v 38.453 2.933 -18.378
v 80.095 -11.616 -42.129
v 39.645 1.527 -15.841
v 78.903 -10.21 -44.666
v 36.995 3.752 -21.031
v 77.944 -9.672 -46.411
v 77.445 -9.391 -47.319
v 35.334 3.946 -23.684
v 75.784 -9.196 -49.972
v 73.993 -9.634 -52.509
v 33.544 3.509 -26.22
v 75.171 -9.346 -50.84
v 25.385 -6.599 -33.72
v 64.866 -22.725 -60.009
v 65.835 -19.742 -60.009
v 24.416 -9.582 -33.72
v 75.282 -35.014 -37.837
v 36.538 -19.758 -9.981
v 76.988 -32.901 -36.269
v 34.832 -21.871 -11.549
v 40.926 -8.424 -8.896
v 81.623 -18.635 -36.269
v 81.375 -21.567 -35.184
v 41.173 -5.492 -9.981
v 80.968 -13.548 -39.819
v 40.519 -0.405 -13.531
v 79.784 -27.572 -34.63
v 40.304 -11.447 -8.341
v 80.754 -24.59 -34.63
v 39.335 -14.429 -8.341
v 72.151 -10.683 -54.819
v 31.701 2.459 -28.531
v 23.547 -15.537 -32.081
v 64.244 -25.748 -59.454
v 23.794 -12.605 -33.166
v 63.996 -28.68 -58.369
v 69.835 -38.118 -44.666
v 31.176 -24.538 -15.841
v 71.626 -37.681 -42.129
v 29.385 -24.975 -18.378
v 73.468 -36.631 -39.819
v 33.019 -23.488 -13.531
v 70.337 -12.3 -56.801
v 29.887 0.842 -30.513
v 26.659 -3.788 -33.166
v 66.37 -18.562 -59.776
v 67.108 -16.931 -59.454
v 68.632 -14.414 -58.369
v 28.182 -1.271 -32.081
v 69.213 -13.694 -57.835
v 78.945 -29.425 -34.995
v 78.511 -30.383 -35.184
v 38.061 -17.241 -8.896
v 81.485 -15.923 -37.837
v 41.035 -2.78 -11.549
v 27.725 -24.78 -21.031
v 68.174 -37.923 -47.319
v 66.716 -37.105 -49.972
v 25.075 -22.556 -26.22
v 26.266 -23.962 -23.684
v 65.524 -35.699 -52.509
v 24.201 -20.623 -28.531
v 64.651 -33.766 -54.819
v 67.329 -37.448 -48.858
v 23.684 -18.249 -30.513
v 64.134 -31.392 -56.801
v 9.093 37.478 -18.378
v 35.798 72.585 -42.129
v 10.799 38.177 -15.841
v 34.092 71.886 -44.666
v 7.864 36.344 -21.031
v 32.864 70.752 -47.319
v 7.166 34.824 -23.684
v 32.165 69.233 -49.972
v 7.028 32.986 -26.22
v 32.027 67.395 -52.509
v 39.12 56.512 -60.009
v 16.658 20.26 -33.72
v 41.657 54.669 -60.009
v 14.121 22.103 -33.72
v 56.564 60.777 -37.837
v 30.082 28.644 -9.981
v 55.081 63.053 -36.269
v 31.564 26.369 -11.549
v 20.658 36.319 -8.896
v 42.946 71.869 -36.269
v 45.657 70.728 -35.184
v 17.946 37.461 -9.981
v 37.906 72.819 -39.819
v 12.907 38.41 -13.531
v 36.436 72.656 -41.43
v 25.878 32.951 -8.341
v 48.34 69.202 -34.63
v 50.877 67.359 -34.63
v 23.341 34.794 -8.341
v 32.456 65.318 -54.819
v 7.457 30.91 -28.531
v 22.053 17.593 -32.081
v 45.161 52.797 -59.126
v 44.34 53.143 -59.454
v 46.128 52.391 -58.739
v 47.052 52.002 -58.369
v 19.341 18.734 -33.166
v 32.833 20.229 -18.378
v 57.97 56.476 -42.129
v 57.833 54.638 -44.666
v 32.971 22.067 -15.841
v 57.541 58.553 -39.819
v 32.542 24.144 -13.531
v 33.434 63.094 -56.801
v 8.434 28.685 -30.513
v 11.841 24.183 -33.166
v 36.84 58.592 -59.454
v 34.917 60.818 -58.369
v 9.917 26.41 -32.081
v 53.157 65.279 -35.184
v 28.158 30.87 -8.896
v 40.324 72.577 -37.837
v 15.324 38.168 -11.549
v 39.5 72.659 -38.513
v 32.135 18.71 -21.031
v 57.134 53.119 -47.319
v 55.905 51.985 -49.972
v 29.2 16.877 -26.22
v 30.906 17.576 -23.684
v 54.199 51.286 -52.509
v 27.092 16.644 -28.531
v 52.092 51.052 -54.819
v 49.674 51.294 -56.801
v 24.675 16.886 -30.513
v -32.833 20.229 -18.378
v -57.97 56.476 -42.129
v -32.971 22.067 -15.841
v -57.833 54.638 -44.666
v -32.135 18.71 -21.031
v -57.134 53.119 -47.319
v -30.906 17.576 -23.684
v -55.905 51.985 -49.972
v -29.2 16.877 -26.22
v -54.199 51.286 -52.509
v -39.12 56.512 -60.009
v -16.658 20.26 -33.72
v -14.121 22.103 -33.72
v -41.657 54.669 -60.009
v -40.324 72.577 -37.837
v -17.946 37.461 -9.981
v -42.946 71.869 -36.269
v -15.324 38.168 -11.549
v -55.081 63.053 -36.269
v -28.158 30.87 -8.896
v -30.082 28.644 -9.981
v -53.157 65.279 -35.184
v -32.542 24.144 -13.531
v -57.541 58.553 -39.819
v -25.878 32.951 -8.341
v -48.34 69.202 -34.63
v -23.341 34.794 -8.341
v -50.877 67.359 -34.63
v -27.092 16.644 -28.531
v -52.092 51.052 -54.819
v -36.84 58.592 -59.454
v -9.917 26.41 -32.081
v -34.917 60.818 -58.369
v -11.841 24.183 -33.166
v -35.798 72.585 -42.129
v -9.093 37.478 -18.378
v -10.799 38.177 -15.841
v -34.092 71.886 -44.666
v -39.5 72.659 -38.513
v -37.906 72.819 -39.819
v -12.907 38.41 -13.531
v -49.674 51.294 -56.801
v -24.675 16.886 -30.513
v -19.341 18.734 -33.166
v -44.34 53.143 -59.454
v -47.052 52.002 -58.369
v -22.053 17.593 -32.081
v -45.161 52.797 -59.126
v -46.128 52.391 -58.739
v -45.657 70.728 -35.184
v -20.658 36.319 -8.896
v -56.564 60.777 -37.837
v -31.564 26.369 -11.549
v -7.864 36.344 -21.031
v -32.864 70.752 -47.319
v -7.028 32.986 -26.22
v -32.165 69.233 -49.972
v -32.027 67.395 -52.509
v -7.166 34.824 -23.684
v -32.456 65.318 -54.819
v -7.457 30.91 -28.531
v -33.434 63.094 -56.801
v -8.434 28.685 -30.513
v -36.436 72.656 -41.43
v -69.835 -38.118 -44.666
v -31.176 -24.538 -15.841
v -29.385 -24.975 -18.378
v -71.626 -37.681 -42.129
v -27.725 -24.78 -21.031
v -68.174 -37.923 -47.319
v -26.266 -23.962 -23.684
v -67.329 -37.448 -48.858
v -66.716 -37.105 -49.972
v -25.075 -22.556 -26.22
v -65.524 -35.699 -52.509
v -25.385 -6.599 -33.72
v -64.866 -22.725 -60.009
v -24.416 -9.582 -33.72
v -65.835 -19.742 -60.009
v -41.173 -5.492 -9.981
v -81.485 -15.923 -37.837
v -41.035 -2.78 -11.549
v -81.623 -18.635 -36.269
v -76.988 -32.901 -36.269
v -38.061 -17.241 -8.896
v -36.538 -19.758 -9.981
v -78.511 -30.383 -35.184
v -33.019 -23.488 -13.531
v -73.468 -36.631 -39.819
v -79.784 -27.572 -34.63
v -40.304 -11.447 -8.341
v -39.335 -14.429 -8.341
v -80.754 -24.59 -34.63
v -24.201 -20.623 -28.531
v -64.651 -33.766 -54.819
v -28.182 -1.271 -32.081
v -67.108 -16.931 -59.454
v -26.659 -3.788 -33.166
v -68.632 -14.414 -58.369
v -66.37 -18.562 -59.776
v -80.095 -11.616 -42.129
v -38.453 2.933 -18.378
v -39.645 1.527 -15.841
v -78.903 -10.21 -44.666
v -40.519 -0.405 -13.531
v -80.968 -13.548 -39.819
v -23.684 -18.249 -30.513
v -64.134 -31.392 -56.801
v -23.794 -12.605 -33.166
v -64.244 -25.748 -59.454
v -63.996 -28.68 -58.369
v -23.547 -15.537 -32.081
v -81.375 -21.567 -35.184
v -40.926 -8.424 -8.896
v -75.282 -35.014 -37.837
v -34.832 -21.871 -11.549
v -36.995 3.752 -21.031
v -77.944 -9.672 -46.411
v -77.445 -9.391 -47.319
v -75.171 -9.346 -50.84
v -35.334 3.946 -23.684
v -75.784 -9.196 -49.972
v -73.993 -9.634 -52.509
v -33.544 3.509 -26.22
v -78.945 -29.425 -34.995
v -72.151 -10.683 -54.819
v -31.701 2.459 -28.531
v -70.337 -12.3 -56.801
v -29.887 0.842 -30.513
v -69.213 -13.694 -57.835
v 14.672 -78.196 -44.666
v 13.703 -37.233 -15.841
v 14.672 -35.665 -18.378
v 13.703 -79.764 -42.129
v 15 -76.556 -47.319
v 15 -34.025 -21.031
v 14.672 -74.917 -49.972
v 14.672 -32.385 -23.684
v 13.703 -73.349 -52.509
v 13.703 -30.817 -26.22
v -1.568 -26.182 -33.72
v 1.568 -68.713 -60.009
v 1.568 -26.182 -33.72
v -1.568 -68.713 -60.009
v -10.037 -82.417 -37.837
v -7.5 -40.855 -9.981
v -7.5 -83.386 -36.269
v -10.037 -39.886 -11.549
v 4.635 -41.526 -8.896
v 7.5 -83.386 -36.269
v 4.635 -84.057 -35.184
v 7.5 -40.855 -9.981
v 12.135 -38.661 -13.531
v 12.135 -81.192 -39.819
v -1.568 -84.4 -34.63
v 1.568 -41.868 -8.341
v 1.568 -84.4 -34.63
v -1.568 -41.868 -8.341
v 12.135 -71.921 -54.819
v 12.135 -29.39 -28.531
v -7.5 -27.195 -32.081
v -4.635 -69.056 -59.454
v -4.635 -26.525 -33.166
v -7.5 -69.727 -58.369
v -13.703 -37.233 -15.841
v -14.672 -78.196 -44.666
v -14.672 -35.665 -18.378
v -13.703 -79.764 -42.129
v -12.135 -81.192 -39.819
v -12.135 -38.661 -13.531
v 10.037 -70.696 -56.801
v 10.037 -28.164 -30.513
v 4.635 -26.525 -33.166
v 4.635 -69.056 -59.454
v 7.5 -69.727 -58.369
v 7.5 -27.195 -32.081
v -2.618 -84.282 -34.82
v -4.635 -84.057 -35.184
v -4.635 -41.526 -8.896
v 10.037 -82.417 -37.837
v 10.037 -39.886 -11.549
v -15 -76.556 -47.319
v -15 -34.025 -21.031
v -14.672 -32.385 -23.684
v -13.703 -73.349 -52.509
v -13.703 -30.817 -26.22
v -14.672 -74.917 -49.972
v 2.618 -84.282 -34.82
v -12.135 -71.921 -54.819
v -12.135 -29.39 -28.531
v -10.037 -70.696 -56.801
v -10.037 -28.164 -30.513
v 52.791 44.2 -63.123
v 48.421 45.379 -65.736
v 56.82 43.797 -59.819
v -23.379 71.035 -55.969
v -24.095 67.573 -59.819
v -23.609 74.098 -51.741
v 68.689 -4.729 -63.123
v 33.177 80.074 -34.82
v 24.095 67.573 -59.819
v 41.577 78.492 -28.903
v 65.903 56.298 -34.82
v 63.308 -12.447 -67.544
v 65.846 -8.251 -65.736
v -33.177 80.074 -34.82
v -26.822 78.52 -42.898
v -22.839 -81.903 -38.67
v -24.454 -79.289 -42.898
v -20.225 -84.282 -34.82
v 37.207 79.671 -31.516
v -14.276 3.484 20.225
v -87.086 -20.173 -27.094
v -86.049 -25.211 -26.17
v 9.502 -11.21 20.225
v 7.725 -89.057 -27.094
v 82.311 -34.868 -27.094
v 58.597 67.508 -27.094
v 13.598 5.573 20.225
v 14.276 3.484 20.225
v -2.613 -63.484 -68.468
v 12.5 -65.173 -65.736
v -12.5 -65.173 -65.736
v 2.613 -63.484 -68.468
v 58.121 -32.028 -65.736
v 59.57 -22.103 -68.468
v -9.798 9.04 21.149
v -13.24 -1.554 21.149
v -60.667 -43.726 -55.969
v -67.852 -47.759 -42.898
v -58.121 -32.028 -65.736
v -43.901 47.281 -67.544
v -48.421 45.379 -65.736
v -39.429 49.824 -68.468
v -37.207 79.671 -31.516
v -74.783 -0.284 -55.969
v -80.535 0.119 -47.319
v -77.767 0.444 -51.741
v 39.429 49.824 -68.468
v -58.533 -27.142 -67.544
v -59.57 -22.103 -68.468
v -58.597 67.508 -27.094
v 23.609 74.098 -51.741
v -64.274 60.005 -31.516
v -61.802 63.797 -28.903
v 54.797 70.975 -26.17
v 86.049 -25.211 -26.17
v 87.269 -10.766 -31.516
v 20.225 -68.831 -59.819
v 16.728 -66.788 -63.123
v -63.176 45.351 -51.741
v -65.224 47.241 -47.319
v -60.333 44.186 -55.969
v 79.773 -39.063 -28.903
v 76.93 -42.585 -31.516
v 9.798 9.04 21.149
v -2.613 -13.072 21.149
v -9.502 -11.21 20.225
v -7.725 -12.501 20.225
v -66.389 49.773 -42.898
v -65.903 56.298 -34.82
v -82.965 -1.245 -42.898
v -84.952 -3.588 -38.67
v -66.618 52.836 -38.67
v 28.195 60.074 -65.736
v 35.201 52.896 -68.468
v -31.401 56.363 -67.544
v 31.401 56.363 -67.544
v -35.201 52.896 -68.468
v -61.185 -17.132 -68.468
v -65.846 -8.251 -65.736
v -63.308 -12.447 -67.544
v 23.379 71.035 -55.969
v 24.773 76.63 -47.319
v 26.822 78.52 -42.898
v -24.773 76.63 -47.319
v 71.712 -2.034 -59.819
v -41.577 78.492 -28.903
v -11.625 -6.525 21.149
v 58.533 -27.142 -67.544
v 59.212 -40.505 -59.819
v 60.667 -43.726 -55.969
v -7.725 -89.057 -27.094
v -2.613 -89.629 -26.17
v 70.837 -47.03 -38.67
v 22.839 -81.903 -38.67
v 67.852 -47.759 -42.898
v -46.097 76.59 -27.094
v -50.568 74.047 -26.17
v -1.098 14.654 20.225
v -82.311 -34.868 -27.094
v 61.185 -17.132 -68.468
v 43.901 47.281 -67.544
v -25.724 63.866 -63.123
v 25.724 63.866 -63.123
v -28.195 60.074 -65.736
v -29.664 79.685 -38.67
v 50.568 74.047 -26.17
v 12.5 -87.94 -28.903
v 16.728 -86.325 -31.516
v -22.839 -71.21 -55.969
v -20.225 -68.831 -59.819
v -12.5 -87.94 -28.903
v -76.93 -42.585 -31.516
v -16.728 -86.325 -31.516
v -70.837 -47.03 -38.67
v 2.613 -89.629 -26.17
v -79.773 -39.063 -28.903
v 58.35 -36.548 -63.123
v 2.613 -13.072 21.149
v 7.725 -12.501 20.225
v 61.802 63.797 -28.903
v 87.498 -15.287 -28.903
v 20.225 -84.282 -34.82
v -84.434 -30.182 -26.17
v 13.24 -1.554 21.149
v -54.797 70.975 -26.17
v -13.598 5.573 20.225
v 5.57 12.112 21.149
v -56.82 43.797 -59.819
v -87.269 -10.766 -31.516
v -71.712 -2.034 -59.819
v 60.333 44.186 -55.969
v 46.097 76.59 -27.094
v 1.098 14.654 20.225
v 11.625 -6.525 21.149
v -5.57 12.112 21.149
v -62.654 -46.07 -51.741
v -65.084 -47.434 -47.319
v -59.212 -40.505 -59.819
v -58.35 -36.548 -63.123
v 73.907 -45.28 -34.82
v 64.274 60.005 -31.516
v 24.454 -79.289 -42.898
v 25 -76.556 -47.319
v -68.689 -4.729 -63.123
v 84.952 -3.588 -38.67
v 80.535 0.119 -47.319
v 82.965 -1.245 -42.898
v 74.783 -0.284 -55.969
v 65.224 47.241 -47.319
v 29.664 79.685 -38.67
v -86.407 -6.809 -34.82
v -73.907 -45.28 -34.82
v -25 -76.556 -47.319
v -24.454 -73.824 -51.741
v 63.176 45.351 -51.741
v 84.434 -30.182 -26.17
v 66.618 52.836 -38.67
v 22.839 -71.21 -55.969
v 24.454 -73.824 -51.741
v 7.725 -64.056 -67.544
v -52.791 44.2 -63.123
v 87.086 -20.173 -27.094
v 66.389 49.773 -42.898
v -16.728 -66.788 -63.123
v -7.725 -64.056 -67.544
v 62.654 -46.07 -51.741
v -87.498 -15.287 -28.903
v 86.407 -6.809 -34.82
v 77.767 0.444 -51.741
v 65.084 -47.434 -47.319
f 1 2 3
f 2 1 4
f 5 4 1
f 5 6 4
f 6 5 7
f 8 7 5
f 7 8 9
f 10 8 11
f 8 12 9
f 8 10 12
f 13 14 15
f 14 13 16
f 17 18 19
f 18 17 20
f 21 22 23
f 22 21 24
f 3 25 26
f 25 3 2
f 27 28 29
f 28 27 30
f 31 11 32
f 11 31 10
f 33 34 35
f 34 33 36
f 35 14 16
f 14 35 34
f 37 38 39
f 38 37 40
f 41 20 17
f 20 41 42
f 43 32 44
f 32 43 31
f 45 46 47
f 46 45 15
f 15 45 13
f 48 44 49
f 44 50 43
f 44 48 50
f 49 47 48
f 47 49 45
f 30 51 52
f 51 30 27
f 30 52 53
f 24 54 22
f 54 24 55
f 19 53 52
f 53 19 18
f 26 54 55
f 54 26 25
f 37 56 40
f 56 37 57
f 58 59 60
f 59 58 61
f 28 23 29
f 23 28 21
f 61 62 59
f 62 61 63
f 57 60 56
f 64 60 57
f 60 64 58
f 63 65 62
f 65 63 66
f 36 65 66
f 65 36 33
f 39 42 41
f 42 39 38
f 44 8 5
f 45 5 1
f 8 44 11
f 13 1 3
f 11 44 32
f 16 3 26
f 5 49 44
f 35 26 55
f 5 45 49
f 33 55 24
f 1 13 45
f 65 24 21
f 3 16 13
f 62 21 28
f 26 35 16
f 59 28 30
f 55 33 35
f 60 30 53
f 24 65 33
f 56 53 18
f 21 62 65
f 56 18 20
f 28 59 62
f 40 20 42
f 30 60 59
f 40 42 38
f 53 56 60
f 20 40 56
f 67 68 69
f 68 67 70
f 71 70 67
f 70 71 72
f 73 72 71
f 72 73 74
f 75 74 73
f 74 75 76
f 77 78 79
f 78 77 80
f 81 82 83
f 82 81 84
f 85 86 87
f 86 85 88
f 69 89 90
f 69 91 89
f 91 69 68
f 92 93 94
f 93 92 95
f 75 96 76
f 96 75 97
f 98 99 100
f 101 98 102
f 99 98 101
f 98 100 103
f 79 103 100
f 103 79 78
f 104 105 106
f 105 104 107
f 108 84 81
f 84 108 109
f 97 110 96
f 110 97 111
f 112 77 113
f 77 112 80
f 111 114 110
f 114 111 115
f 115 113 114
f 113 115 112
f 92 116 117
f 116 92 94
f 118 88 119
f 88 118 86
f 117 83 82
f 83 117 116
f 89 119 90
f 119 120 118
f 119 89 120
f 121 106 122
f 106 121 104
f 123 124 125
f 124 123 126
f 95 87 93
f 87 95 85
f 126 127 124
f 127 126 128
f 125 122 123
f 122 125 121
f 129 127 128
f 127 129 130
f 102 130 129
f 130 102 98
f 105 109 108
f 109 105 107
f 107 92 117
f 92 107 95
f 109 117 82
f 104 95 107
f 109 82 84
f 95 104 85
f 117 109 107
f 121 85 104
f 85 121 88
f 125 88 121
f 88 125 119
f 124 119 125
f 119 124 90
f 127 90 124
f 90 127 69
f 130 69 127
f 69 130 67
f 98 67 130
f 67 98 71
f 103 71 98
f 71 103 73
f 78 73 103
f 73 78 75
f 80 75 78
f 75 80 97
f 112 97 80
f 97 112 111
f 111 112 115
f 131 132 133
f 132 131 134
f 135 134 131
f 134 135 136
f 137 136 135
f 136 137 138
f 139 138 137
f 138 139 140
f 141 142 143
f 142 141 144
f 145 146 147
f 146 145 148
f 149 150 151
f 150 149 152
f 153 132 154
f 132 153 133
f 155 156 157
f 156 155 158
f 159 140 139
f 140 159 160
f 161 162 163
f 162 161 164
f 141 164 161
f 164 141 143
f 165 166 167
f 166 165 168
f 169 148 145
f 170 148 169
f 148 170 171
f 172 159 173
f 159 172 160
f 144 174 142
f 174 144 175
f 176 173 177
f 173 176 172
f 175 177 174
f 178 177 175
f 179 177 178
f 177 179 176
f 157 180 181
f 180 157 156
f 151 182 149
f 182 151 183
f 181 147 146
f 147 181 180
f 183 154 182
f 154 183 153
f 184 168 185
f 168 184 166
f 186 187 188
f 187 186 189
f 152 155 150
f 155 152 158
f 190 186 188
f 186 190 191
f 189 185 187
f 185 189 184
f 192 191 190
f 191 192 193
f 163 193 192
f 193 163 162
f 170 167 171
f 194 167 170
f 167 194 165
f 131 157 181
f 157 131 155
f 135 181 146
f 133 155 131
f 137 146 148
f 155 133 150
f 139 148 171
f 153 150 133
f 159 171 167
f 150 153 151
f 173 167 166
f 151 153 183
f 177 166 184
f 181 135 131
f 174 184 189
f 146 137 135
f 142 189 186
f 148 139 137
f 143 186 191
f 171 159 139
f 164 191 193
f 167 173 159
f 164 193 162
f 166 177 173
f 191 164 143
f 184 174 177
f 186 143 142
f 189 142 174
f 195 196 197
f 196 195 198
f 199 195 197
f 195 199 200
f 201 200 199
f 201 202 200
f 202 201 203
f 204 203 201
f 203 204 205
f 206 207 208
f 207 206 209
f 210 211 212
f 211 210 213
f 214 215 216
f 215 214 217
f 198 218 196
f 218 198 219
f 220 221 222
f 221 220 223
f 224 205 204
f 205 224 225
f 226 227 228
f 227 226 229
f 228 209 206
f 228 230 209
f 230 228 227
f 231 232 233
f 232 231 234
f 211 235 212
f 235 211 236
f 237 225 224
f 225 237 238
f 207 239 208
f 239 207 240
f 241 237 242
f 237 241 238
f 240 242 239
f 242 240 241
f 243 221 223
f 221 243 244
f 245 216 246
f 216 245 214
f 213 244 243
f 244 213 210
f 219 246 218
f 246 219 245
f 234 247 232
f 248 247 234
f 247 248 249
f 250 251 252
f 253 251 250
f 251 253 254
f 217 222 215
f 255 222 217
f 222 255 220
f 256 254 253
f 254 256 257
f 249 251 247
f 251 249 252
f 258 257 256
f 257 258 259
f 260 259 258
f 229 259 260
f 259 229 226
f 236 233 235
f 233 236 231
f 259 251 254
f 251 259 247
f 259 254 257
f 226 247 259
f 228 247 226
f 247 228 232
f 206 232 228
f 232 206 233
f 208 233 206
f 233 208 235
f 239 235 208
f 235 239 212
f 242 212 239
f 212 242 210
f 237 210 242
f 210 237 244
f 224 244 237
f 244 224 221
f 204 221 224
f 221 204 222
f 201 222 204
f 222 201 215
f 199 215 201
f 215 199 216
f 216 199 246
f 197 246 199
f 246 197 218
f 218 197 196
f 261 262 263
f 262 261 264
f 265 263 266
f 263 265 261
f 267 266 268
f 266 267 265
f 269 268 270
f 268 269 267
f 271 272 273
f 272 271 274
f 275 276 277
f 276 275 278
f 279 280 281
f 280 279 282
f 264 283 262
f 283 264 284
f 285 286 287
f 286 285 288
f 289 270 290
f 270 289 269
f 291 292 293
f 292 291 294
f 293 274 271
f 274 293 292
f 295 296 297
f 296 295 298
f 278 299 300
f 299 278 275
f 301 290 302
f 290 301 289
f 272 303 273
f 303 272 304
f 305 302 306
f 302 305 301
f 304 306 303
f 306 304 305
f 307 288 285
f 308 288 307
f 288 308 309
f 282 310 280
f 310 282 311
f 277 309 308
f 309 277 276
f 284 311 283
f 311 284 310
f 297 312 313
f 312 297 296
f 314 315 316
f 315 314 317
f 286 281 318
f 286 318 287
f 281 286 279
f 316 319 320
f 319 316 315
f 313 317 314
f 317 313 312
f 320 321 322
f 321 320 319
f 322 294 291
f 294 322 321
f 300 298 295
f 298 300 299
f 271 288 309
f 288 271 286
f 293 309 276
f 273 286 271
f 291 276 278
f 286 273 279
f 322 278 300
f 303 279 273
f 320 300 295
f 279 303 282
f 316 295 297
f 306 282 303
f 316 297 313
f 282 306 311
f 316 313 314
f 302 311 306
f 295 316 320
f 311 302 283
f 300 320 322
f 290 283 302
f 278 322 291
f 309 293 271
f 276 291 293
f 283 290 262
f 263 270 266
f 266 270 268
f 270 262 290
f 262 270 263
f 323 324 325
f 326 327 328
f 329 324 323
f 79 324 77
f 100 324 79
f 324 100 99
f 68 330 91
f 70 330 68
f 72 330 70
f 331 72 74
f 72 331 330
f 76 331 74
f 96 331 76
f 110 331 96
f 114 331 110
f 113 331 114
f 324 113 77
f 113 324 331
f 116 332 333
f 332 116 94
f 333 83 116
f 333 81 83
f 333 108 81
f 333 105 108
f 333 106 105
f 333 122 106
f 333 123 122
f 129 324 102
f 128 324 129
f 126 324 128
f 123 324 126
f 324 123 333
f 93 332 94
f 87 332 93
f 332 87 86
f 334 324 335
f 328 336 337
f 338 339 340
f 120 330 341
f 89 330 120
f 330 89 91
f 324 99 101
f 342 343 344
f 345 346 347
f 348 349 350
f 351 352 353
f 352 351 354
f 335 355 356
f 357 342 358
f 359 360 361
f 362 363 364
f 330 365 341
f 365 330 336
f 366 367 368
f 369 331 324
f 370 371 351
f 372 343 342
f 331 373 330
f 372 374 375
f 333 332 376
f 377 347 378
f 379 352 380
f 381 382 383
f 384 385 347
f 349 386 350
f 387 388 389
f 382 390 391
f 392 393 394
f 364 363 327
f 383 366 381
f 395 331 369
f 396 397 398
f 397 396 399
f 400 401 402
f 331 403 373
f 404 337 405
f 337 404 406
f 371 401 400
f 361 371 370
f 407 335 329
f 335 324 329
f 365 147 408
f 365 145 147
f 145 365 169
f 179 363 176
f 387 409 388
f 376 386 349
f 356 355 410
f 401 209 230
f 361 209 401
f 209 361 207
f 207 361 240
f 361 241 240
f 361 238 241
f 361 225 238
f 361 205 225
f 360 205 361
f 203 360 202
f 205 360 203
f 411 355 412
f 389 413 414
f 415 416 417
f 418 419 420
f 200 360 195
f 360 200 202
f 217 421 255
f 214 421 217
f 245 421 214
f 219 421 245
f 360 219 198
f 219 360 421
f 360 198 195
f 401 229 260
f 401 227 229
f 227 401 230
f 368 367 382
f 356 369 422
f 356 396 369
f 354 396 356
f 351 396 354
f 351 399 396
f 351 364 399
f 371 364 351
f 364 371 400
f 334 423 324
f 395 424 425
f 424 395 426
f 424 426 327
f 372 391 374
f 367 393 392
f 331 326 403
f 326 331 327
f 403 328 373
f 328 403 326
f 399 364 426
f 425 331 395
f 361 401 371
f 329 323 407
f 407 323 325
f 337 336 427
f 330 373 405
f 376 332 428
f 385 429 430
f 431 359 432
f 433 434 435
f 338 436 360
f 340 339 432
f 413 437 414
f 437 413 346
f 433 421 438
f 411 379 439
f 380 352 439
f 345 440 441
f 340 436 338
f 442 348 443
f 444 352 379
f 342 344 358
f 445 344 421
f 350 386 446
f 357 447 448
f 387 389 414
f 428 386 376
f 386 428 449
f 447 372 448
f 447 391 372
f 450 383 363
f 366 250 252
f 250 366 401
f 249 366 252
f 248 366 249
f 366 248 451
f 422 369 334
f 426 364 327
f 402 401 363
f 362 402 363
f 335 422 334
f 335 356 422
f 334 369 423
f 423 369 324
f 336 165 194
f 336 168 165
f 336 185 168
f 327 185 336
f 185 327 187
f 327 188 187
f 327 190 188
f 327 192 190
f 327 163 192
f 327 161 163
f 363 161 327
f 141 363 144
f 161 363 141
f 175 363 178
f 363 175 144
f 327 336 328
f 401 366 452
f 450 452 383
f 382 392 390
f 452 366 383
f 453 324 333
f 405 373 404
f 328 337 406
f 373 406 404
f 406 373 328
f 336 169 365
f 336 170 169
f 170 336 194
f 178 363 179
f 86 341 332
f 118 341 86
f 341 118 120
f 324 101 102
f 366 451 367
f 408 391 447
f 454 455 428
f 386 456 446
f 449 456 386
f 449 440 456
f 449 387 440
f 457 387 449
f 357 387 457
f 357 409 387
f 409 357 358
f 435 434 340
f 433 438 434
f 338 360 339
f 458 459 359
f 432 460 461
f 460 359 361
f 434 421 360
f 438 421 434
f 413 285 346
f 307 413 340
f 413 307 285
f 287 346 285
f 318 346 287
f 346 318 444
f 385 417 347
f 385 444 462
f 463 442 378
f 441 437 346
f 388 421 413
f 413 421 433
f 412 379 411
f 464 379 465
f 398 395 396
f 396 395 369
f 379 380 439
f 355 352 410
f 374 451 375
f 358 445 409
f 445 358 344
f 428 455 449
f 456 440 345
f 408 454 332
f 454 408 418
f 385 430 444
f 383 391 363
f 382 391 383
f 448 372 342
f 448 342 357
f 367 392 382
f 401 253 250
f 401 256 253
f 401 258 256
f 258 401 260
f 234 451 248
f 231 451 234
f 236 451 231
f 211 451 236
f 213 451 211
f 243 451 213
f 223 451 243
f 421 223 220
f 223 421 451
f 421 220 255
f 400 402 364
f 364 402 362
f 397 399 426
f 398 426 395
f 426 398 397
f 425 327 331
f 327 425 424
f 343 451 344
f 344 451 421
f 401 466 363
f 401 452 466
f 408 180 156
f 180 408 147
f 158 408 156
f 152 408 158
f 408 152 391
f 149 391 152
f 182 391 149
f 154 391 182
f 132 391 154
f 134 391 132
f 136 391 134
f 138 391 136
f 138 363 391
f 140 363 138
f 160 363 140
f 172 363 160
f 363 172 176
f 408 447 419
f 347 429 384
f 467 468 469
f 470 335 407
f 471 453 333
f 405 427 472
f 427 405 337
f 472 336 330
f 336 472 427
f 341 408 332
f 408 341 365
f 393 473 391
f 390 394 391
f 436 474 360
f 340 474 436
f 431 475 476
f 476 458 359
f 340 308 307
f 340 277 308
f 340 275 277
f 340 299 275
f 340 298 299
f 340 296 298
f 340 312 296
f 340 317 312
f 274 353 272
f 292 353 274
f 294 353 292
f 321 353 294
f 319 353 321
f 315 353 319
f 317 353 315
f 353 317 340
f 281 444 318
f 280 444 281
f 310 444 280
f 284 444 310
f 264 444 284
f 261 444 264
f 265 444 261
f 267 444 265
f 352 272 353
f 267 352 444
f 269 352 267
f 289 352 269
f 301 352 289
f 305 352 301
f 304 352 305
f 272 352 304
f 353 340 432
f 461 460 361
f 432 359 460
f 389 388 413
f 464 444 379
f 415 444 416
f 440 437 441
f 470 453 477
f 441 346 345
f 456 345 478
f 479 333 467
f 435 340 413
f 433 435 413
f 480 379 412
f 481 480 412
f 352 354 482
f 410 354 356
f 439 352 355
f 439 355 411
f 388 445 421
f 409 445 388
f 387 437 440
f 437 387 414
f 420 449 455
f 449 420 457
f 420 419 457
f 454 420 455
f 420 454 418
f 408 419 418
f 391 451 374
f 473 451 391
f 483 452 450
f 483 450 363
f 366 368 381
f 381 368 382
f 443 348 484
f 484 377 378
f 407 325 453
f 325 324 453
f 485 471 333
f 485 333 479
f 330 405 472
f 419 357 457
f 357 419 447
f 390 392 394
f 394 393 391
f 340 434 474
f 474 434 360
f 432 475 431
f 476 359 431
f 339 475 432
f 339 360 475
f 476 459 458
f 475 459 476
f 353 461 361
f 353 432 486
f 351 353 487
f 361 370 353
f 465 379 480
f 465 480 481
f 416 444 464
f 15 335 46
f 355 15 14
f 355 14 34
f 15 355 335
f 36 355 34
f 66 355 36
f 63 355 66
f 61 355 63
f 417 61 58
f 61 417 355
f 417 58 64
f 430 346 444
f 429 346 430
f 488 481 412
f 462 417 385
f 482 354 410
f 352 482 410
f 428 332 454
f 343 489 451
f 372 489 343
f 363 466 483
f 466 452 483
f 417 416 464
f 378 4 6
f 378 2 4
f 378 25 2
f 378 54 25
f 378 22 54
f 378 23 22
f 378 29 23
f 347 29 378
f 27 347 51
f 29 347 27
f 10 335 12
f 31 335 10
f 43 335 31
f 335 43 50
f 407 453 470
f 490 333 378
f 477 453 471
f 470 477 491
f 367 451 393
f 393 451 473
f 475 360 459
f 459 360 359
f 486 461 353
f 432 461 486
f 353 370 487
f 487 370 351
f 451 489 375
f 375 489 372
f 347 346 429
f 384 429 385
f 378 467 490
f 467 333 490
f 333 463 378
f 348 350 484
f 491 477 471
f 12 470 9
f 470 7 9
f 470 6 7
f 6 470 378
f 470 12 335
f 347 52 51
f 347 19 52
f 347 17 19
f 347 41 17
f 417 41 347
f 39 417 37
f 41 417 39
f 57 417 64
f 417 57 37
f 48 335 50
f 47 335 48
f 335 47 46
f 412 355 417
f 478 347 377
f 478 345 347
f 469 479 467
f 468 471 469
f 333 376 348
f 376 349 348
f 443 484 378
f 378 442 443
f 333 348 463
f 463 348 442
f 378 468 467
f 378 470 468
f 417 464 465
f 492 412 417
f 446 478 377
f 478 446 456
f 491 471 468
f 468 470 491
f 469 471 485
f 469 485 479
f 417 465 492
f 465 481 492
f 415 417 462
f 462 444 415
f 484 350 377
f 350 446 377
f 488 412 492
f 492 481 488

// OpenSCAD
//Diameter of rod in centimeters
Rod_Diameter = 3;
//Depth of rod socket in centimeters
Rod_Depth = 5; 
// Wall thickness around rod.
Wall_Thickness = 1;

module GenConnector()
{
	Rod_Radius = (Rod_Diameter/2)*1000;
	Rod_Depth =  Rod_Depth*1000;
	Wall_Thickness = Wall_Thickness*1000;
    
	Distance_From_Core = (Rod_Radius*2)+Wall_Thickness;
	Total_Rod = Distance_From_Core + Rod_Depth; // Full rod size is Rod_Depth+Distance_From_Core
scale(0.01,0.01,0.01){	
	difference() {
		hull(){
			rotate([90,0,0]){
				for(i = [1 :5]){
					rotate([31.720,72.000*i,0]){
                        cylinder(r = (Rod_Radius+Wall_Thickness), h = Total_Rod ); // Outside Shape
					}
				}
			}
		}

		rotate([90,0,0]){
			for(i = [1 :5]){
				rotate([31.720,72.000*i,0]){
					difference() {
						cylinder(r = Rod_Radius, h = Total_Rod ); // Inside holes. h is distance from core, and Rod_Depth.
						cylinder(r = Rod_Radius, h = Distance_From_Core ); // Distance from core. Should be atleast  Diameter of rod //2990 (2540+500) 3040
					}
				}
			}
		}
	}
}
}

GenConnector();
